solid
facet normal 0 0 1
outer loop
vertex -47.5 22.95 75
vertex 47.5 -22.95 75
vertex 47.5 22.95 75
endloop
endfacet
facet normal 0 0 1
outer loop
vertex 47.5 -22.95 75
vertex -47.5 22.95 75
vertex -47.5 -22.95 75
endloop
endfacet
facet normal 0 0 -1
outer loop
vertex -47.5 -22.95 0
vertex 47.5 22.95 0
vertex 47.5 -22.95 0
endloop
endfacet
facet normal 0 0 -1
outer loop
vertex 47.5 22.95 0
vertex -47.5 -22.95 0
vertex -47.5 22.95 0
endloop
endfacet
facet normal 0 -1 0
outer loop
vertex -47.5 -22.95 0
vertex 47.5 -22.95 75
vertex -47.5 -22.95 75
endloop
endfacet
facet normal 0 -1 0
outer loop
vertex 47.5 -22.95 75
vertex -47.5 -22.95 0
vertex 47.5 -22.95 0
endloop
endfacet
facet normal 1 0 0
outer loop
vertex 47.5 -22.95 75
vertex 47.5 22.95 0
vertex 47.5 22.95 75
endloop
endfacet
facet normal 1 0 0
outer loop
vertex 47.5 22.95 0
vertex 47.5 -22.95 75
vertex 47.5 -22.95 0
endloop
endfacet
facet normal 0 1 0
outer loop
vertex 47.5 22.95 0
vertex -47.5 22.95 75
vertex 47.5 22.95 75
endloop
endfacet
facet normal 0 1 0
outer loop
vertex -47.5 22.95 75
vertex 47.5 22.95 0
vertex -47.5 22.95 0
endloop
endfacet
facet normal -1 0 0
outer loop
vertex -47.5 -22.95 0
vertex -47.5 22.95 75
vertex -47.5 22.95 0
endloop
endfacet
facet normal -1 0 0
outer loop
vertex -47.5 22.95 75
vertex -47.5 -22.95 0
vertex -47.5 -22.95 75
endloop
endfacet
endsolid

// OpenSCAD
// Provisional case envelope; no print.
translate([-47.5,-22.95,0]) cube([95,45.9,75]);
